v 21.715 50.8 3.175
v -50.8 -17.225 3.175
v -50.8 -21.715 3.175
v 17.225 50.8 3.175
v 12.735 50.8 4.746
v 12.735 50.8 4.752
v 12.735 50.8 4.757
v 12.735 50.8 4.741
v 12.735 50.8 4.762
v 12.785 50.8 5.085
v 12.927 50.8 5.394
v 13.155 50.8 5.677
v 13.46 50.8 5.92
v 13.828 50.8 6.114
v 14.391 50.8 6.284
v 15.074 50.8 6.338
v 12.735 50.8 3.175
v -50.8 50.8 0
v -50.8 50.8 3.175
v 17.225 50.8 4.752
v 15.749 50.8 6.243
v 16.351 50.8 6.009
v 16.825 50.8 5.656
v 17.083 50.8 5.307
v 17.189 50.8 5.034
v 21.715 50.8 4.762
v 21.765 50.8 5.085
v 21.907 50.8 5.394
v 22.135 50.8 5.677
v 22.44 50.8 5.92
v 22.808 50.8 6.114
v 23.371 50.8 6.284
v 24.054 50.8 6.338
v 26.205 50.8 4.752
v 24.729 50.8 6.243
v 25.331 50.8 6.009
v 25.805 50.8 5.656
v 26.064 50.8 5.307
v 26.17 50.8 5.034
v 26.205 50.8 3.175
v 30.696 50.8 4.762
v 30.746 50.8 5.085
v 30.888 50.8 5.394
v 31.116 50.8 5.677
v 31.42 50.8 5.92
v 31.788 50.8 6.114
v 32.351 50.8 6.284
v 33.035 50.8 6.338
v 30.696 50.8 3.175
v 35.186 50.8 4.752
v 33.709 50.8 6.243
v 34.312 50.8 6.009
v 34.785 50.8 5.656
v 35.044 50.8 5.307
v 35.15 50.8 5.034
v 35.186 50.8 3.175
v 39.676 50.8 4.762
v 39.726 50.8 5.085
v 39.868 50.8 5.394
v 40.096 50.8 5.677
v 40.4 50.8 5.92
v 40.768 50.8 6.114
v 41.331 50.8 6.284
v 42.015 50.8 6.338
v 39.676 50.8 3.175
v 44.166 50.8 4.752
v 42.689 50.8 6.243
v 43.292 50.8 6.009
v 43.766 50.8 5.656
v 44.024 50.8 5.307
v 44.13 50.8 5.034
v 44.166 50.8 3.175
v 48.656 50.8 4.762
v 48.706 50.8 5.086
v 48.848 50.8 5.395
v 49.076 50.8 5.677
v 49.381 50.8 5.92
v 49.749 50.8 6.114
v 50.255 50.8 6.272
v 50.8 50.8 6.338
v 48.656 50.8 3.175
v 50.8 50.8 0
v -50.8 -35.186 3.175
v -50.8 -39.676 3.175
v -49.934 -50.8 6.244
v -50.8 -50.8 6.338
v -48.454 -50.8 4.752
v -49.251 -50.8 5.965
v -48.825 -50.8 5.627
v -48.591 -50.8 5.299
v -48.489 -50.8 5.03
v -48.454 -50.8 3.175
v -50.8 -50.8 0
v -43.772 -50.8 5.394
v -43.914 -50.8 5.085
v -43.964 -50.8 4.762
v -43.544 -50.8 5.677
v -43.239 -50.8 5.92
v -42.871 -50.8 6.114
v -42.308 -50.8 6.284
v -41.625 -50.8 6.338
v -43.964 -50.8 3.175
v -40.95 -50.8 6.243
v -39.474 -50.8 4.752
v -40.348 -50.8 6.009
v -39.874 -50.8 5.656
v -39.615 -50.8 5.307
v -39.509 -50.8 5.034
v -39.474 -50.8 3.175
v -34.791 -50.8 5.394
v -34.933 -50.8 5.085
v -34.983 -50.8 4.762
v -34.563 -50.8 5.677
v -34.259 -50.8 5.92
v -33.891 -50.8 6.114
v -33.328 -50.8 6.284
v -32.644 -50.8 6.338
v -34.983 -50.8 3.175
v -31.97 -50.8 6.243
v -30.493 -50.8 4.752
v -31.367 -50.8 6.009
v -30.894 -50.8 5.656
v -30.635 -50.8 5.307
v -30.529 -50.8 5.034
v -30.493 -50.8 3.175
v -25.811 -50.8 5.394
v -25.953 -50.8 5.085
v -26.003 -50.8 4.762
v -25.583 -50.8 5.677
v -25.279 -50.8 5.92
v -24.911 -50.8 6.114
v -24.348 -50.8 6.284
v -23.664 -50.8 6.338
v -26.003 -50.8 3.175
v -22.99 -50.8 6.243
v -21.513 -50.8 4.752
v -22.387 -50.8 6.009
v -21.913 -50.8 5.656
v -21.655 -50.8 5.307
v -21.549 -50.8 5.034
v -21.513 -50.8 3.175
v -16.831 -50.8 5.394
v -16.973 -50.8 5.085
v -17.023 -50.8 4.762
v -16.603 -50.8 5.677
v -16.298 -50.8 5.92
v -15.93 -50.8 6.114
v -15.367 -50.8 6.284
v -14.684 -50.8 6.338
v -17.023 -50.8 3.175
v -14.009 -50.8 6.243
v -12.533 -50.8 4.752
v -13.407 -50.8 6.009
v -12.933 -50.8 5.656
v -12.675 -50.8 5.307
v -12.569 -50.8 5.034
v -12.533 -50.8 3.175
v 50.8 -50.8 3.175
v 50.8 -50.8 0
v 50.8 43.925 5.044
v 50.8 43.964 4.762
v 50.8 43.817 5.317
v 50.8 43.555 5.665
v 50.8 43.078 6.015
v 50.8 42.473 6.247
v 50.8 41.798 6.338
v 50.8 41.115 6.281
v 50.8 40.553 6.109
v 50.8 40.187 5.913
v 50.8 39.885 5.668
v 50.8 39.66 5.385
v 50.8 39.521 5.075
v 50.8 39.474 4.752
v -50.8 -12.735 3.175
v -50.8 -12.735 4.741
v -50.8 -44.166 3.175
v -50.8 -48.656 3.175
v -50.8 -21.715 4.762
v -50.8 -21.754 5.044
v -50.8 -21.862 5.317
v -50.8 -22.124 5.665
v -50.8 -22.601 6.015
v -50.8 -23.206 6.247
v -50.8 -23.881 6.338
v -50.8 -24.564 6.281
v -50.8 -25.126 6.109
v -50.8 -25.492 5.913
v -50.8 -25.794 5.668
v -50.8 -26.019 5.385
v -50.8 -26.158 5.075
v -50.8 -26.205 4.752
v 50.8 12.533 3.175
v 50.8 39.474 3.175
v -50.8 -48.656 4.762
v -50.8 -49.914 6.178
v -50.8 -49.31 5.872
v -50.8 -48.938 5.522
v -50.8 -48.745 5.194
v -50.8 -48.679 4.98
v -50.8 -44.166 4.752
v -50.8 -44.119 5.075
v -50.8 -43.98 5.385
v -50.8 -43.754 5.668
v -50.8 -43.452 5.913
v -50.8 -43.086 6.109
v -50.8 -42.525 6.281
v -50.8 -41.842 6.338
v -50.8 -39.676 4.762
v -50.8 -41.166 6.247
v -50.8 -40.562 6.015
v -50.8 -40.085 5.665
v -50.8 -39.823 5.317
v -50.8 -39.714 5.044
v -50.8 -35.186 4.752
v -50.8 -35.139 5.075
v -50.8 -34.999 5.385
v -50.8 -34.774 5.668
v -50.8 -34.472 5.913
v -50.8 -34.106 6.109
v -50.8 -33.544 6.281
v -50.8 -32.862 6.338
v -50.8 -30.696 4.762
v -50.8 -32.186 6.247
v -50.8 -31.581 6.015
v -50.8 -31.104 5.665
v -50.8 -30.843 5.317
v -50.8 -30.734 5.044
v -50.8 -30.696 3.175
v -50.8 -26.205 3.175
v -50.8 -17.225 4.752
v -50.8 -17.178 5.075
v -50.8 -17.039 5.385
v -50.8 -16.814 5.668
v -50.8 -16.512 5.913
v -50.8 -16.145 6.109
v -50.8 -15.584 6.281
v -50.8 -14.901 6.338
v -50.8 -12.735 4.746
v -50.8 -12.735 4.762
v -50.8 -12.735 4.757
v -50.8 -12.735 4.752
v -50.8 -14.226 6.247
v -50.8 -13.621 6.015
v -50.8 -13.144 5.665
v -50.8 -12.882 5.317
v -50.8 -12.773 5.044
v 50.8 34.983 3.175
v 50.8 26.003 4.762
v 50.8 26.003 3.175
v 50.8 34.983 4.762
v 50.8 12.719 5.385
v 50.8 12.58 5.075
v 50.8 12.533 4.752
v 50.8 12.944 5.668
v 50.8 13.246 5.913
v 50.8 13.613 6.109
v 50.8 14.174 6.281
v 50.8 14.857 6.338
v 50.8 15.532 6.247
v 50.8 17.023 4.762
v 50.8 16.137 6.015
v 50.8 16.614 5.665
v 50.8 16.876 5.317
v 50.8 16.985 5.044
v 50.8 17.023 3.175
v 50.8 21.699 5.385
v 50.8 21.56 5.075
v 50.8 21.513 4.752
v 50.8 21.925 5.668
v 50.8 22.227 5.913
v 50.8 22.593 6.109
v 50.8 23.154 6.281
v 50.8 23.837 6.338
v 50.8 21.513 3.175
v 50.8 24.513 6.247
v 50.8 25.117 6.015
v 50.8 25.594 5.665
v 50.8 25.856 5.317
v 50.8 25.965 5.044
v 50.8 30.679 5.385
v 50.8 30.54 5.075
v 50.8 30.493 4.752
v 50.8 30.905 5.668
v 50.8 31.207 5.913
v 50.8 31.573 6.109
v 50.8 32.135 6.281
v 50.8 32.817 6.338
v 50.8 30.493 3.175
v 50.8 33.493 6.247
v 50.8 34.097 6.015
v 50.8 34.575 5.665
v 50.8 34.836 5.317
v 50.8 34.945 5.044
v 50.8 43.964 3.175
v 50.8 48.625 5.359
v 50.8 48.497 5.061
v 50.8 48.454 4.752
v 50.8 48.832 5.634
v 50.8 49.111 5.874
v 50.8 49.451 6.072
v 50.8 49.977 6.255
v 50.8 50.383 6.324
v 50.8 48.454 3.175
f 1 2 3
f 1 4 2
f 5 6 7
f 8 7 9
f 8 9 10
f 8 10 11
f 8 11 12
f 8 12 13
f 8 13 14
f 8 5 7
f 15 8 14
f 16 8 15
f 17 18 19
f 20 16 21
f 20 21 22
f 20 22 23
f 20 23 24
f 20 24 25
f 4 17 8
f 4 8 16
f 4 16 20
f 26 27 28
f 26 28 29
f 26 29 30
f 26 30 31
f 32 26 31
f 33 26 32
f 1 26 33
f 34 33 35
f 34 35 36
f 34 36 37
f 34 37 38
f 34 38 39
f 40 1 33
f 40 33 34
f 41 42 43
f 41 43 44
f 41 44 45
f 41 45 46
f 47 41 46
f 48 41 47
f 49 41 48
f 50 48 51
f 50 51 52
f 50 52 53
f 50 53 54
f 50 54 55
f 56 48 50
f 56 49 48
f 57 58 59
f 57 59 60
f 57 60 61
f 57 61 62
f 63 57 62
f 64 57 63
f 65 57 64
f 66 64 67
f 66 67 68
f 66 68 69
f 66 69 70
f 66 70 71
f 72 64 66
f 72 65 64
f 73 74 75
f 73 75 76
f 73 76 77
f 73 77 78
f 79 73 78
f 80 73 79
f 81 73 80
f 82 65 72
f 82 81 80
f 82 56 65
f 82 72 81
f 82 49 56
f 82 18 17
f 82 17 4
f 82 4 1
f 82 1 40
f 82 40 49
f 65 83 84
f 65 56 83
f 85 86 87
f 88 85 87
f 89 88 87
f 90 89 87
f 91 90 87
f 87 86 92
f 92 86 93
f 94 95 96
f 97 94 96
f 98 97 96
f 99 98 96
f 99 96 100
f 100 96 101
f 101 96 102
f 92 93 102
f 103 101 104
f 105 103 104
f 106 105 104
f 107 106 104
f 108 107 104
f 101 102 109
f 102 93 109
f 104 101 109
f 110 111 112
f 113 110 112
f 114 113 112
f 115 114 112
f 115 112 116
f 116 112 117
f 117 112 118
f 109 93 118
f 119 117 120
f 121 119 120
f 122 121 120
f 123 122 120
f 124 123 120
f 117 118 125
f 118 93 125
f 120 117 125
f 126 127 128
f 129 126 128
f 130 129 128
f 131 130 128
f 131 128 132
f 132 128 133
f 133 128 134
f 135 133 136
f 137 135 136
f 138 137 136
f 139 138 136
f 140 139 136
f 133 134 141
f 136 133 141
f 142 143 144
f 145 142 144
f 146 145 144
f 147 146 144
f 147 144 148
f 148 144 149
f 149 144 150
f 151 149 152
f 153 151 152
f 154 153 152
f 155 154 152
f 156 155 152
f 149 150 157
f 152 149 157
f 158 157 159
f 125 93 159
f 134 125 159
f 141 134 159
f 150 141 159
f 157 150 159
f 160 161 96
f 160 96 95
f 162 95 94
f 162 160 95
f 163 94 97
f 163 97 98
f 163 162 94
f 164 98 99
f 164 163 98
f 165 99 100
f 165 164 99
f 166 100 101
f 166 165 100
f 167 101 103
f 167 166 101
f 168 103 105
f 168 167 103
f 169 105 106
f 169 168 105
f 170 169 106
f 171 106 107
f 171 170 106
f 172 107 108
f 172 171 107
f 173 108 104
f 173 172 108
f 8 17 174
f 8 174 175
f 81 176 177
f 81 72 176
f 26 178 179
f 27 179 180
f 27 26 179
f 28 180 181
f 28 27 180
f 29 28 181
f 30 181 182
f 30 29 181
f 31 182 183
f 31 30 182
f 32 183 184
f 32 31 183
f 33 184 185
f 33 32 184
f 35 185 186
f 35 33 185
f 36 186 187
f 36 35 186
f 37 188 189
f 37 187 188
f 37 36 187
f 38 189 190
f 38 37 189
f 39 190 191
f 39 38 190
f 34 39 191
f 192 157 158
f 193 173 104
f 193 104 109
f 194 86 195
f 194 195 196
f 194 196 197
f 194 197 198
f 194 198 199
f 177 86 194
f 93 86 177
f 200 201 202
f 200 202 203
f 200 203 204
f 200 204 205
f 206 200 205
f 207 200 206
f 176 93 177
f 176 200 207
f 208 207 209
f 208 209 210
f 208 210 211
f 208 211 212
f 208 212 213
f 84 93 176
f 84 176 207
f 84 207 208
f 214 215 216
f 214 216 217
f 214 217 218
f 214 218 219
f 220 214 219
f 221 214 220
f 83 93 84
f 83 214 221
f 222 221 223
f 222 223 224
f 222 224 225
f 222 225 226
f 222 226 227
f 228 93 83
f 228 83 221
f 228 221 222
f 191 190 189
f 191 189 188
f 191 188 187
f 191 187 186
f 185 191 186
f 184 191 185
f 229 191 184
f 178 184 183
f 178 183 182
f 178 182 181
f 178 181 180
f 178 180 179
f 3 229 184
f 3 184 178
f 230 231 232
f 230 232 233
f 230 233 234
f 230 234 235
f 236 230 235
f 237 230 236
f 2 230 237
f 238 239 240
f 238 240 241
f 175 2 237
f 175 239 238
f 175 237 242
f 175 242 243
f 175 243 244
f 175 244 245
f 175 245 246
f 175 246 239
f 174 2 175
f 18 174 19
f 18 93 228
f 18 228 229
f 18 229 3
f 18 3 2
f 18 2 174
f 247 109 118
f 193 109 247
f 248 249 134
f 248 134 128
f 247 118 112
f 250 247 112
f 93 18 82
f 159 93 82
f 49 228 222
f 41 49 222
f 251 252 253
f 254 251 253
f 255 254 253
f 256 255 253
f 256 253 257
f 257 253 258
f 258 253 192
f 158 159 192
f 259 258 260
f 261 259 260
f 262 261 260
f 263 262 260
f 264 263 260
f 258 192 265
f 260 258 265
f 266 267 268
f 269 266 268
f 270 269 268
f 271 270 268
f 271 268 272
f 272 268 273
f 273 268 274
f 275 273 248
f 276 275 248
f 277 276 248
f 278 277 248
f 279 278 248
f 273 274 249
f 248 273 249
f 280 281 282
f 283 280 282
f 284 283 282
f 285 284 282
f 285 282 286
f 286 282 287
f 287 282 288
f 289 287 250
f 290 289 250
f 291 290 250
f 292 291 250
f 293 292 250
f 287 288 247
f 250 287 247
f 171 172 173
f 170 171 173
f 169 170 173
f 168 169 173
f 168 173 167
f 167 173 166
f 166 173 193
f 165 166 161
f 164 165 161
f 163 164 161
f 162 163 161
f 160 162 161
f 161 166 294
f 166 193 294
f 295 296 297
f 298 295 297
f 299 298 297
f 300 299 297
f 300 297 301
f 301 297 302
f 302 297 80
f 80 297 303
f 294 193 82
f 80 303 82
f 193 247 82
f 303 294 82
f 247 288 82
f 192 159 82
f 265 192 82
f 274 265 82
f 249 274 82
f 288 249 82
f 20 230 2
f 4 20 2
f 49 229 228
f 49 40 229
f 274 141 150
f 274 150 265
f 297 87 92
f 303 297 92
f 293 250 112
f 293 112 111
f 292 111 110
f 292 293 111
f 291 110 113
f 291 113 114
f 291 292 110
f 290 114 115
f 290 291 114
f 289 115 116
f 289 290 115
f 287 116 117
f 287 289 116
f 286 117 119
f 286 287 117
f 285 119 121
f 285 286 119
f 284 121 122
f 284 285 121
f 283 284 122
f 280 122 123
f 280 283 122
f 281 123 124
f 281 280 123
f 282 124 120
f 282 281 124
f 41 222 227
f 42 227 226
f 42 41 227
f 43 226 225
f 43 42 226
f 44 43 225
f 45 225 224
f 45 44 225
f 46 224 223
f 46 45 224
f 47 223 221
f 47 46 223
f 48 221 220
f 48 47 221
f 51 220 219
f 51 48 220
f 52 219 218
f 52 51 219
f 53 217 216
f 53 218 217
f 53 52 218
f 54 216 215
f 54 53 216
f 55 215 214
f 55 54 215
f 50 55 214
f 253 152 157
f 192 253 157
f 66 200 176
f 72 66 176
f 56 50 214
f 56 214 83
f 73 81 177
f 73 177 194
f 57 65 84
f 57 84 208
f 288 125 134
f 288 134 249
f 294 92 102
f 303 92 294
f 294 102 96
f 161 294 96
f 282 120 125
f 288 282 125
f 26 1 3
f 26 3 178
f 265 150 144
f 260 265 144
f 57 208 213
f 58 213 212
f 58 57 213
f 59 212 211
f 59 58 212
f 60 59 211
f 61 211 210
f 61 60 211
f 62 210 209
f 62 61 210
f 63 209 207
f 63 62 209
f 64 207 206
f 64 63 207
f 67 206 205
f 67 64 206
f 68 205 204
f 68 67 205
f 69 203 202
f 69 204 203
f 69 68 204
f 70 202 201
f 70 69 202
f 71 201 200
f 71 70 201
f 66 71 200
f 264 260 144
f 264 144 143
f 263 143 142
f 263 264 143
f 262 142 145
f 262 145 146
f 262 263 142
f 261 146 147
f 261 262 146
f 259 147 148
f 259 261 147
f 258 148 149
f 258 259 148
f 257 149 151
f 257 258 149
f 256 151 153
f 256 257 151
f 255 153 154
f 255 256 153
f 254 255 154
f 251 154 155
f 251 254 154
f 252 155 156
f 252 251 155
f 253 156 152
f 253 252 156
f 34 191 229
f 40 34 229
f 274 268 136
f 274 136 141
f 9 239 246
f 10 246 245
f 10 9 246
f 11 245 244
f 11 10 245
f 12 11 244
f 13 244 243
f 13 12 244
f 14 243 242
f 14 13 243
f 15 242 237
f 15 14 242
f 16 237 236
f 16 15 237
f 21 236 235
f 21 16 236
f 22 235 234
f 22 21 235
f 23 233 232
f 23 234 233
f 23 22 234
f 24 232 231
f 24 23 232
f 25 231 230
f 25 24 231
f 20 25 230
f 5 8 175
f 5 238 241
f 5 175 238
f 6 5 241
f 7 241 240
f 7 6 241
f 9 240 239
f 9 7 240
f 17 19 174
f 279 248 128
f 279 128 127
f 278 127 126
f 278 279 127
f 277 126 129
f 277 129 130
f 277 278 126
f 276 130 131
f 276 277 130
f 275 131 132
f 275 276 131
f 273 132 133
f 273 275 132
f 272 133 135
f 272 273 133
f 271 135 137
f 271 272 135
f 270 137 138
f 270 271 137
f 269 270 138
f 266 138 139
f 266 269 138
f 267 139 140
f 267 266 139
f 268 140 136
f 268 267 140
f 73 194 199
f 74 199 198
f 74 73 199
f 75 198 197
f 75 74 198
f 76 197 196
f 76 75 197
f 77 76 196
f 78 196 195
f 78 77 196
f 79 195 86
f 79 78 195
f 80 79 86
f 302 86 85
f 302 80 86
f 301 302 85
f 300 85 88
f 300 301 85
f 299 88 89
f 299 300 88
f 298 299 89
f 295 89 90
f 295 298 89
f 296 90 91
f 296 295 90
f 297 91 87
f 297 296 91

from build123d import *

# Parameters (mm, degrees)
F0_W      = 101.6
F0_H      = 101.6
F1_DEPTH  = 3.175
F5_DEPTH  = 50.8
F6_DEPTH  = 57.15
F7_DEPTH  = 63.5
F8_DEPTH  = 69.85
F9_DEPTH  = 76.2
F10_DEPTH = 69.85
F11_DEPTH = 63.5
F12_DEPTH = 57.15
F13_DEPTH = 50.8
F14_W     = 126.8053464592
F14_H     = 131.9155991077
F14_W_2   = 101.6
F14_H_2   = 101.6
F15_DEPTH = 12.7


with BuildPart() as f1:
    # F0 (on Top) → F1 (new body)
    with BuildSketch(Plane.XY):
        Rectangle(F0_W, F0_H)
    extrude(amount=F1_DEPTH)

    # F4 (on line) → F5 (join, symmetric)
    with BuildSketch(Plane(origin=(0, 0, 0), x_dir=(-0.7071067812, 0.7071067812, 0), z_dir=(0.7071067812, 0.7071067812, 0))):
        with BuildLine():
            Line((26.9160220652, 3.175), (26.9160220652, 4.7411556013))
            ThreePointArc((26.9160220652, 4.7411556013), (26.9160579383, 4.7518278006), (26.9160220652, 4.7625))
            ThreePointArc((26.9160220652, 4.7625), (25.3232218085, 6.3393188323), (23.7410579383, 4.7518278006))
            Line((23.7410579383, 4.7518278006), (23.7410579383, 3.175))
            Line((23.7410579383, 3.175), (26.9160220652, 3.175))
        make_face()
    extrude(amount=F5_DEPTH, both=True)

    # F4 (on line) → F6 (join, symmetric)
    with BuildSketch(Plane(origin=(0, 0, 0), x_dir=(-0.7071067812, 0.7071067812, 0), z_dir=(0.7071067812, 0.7071067812, 0))):
        with BuildLine():
            ThreePointArc((20.5660220652, 4.7625), (18.9732218085, 6.3393188323), (17.3910579383, 4.7518278006))
            Line((17.3910579383, 4.7518278006), (17.3910579383, 3.175))
            Line((17.3910579383, 3.175), (20.5660220652, 3.175))
            Line((20.5660220652, 3.175), (20.5660220652, 4.7411556013))
            Line((20.5660220652, 4.7411556013), (20.5660220652, 4.7625))
        make_face()
    extrude(amount=F6_DEPTH, both=True)

    # F4 (on line) → F7 (join, symmetric)
    with BuildSketch(Plane(origin=(0, 0, 0), x_dir=(-0.7071067812, 0.7071067812, 0), z_dir=(0.7071067812, 0.7071067812, 0))):
        with BuildLine():
            ThreePointArc((14.2160220652, 4.7625), (12.6232218085, 6.3393188323), (11.0410579383, 4.7518278006))
            Line((11.0410579383, 4.7518278006), (11.0410579383, 3.175))
            Line((11.0410579383, 3.175), (14.2160220652, 3.175))
            Line((14.2160220652, 3.175), (14.2160220652, 4.7411556013))
            Line((14.2160220652, 4.7411556013), (14.2160220652, 4.7625))
        make_face()
    extrude(amount=F7_DEPTH, both=True)

    # F4 (on line) → F8 (join, symmetric)
    with BuildSketch(Plane(origin=(0, 0, 0), x_dir=(-0.7071067812, 0.7071067812, 0), z_dir=(0.7071067812, 0.7071067812, 0))):
        with BuildLine():
            ThreePointArc((7.8660220652, 4.7625), (6.2732218085, 6.3393188323), (4.6910579383, 4.7518278006))
            Line((4.6910579383, 4.7518278006), (4.6910579383, 3.175))
            Line((4.6910579383, 3.175), (7.8660220652, 3.175))
            Line((7.8660220652, 3.175), (7.8660220652, 4.7411556013))
            Line((7.8660220652, 4.7411556013), (7.8660220652, 4.7625))
        make_face()
    extrude(amount=F8_DEPTH, both=True)

    # F4 (on line) → F9 (join, symmetric)
    with BuildSketch(Plane(origin=(0, 0, 0), x_dir=(-0.7071067812, 0.7071067812, 0), z_dir=(0.7071067812, 0.7071067812, 0))):
        with BuildLine():
            ThreePointArc((1.5160220652, 4.7625), (-0.0767781915, 6.3393188323), (-1.6589420617, 4.7518278006))
            Line((-1.6589420617, 4.7518278006), (-1.6589420617, 3.175))
            Line((-1.6589420617, 3.175), (1.5160220652, 3.175))
            Line((1.5160220652, 3.175), (1.5160220652, 4.7411556013))
            Line((1.5160220652, 4.7411556013), (1.5160220652, 4.7625))
        make_face()
    extrude(amount=F9_DEPTH, both=True)

    # F4 (on line) → F10 (join, symmetric)
    with BuildSketch(Plane(origin=(0, 0, 0), x_dir=(-0.7071067812, 0.7071067812, 0), z_dir=(0.7071067812, 0.7071067812, 0))):
        with BuildLine():
            ThreePointArc((-4.8339779348, 4.7625), (-6.4267781915, 6.3393188323), (-8.0089420617, 4.7518278006))
            Line((-8.0089420617, 4.7518278006), (-8.0089420617, 3.175))
            Line((-8.0089420617, 3.175), (-4.8339779348, 3.175))
            Line((-4.8339779348, 3.175), (-4.8339779348, 4.7411556013))
            Line((-4.8339779348, 4.7411556013), (-4.8339779348, 4.7625))
        make_face()
    extrude(amount=F10_DEPTH, both=True)

    # F4 (on line) → F11 (join, symmetric)
    with BuildSketch(Plane(origin=(0, 0, 0), x_dir=(-0.7071067812, 0.7071067812, 0), z_dir=(0.7071067812, 0.7071067812, 0))):
        with BuildLine():
            ThreePointArc((-11.1839779348, 4.7625), (-12.7767781915, 6.3393188323), (-14.3589420617, 4.7518278006))
            Line((-14.3589420617, 4.7518278006), (-14.3589420617, 3.175))
            Line((-14.3589420617, 3.175), (-11.1839779348, 3.175))
            Line((-11.1839779348, 3.175), (-11.1839779348, 4.7411556013))
            Line((-11.1839779348, 4.7411556013), (-11.1839779348, 4.7625))
        make_face()
    extrude(amount=F11_DEPTH, both=True)

    # F4 (on line) → F12 (join, symmetric)
    with BuildSketch(Plane(origin=(0, 0, 0), x_dir=(-0.7071067812, 0.7071067812, 0), z_dir=(0.7071067812, 0.7071067812, 0))):
        with BuildLine():
            ThreePointArc((-17.5339779348, 4.7625), (-19.1267781915, 6.3393188323), (-20.7089420617, 4.7518278006))
            Line((-20.7089420617, 4.7518278006), (-20.7089420617, 3.175))
            Line((-20.7089420617, 3.175), (-17.5339779348, 3.175))
            Line((-17.5339779348, 3.175), (-17.5339779348, 4.7411556013))
            Line((-17.5339779348, 4.7411556013), (-17.5339779348, 4.7625))
        make_face()
    extrude(amount=F12_DEPTH, both=True)

    # F4 (on line) → F13 (join, symmetric)
    with BuildSketch(Plane(origin=(0, 0, 0), x_dir=(-0.7071067812, 0.7071067812, 0), z_dir=(0.7071067812, 0.7071067812, 0))):
        with BuildLine():
            ThreePointArc((-23.8839779348, 4.7625), (-25.4767781915, 6.3393188323), (-27.0589420617, 4.7518278006))
            Line((-27.0589420617, 4.7518278006), (-27.0589420617, 3.175))
            Line((-27.0589420617, 3.175), (-23.8839779348, 3.175))
            Line((-23.8839779348, 3.175), (-23.8839779348, 4.7411556013))
            Line((-23.8839779348, 4.7411556013), (-23.8839779348, 4.7625))
        make_face()
    extrude(amount=F13_DEPTH, both=True)

    # F14 (on Top) → F15 (cut)
    with BuildSketch(Plane.XY):
        with Locations((0.9669456631, -0.0485852361)):
            Rectangle(F14_W, F14_H)
        Rectangle(F14_W_2, F14_H_2, mode=Mode.SUBTRACT)
    extrude(amount=F15_DEPTH, mode=Mode.SUBTRACT)


solid = f1.part
